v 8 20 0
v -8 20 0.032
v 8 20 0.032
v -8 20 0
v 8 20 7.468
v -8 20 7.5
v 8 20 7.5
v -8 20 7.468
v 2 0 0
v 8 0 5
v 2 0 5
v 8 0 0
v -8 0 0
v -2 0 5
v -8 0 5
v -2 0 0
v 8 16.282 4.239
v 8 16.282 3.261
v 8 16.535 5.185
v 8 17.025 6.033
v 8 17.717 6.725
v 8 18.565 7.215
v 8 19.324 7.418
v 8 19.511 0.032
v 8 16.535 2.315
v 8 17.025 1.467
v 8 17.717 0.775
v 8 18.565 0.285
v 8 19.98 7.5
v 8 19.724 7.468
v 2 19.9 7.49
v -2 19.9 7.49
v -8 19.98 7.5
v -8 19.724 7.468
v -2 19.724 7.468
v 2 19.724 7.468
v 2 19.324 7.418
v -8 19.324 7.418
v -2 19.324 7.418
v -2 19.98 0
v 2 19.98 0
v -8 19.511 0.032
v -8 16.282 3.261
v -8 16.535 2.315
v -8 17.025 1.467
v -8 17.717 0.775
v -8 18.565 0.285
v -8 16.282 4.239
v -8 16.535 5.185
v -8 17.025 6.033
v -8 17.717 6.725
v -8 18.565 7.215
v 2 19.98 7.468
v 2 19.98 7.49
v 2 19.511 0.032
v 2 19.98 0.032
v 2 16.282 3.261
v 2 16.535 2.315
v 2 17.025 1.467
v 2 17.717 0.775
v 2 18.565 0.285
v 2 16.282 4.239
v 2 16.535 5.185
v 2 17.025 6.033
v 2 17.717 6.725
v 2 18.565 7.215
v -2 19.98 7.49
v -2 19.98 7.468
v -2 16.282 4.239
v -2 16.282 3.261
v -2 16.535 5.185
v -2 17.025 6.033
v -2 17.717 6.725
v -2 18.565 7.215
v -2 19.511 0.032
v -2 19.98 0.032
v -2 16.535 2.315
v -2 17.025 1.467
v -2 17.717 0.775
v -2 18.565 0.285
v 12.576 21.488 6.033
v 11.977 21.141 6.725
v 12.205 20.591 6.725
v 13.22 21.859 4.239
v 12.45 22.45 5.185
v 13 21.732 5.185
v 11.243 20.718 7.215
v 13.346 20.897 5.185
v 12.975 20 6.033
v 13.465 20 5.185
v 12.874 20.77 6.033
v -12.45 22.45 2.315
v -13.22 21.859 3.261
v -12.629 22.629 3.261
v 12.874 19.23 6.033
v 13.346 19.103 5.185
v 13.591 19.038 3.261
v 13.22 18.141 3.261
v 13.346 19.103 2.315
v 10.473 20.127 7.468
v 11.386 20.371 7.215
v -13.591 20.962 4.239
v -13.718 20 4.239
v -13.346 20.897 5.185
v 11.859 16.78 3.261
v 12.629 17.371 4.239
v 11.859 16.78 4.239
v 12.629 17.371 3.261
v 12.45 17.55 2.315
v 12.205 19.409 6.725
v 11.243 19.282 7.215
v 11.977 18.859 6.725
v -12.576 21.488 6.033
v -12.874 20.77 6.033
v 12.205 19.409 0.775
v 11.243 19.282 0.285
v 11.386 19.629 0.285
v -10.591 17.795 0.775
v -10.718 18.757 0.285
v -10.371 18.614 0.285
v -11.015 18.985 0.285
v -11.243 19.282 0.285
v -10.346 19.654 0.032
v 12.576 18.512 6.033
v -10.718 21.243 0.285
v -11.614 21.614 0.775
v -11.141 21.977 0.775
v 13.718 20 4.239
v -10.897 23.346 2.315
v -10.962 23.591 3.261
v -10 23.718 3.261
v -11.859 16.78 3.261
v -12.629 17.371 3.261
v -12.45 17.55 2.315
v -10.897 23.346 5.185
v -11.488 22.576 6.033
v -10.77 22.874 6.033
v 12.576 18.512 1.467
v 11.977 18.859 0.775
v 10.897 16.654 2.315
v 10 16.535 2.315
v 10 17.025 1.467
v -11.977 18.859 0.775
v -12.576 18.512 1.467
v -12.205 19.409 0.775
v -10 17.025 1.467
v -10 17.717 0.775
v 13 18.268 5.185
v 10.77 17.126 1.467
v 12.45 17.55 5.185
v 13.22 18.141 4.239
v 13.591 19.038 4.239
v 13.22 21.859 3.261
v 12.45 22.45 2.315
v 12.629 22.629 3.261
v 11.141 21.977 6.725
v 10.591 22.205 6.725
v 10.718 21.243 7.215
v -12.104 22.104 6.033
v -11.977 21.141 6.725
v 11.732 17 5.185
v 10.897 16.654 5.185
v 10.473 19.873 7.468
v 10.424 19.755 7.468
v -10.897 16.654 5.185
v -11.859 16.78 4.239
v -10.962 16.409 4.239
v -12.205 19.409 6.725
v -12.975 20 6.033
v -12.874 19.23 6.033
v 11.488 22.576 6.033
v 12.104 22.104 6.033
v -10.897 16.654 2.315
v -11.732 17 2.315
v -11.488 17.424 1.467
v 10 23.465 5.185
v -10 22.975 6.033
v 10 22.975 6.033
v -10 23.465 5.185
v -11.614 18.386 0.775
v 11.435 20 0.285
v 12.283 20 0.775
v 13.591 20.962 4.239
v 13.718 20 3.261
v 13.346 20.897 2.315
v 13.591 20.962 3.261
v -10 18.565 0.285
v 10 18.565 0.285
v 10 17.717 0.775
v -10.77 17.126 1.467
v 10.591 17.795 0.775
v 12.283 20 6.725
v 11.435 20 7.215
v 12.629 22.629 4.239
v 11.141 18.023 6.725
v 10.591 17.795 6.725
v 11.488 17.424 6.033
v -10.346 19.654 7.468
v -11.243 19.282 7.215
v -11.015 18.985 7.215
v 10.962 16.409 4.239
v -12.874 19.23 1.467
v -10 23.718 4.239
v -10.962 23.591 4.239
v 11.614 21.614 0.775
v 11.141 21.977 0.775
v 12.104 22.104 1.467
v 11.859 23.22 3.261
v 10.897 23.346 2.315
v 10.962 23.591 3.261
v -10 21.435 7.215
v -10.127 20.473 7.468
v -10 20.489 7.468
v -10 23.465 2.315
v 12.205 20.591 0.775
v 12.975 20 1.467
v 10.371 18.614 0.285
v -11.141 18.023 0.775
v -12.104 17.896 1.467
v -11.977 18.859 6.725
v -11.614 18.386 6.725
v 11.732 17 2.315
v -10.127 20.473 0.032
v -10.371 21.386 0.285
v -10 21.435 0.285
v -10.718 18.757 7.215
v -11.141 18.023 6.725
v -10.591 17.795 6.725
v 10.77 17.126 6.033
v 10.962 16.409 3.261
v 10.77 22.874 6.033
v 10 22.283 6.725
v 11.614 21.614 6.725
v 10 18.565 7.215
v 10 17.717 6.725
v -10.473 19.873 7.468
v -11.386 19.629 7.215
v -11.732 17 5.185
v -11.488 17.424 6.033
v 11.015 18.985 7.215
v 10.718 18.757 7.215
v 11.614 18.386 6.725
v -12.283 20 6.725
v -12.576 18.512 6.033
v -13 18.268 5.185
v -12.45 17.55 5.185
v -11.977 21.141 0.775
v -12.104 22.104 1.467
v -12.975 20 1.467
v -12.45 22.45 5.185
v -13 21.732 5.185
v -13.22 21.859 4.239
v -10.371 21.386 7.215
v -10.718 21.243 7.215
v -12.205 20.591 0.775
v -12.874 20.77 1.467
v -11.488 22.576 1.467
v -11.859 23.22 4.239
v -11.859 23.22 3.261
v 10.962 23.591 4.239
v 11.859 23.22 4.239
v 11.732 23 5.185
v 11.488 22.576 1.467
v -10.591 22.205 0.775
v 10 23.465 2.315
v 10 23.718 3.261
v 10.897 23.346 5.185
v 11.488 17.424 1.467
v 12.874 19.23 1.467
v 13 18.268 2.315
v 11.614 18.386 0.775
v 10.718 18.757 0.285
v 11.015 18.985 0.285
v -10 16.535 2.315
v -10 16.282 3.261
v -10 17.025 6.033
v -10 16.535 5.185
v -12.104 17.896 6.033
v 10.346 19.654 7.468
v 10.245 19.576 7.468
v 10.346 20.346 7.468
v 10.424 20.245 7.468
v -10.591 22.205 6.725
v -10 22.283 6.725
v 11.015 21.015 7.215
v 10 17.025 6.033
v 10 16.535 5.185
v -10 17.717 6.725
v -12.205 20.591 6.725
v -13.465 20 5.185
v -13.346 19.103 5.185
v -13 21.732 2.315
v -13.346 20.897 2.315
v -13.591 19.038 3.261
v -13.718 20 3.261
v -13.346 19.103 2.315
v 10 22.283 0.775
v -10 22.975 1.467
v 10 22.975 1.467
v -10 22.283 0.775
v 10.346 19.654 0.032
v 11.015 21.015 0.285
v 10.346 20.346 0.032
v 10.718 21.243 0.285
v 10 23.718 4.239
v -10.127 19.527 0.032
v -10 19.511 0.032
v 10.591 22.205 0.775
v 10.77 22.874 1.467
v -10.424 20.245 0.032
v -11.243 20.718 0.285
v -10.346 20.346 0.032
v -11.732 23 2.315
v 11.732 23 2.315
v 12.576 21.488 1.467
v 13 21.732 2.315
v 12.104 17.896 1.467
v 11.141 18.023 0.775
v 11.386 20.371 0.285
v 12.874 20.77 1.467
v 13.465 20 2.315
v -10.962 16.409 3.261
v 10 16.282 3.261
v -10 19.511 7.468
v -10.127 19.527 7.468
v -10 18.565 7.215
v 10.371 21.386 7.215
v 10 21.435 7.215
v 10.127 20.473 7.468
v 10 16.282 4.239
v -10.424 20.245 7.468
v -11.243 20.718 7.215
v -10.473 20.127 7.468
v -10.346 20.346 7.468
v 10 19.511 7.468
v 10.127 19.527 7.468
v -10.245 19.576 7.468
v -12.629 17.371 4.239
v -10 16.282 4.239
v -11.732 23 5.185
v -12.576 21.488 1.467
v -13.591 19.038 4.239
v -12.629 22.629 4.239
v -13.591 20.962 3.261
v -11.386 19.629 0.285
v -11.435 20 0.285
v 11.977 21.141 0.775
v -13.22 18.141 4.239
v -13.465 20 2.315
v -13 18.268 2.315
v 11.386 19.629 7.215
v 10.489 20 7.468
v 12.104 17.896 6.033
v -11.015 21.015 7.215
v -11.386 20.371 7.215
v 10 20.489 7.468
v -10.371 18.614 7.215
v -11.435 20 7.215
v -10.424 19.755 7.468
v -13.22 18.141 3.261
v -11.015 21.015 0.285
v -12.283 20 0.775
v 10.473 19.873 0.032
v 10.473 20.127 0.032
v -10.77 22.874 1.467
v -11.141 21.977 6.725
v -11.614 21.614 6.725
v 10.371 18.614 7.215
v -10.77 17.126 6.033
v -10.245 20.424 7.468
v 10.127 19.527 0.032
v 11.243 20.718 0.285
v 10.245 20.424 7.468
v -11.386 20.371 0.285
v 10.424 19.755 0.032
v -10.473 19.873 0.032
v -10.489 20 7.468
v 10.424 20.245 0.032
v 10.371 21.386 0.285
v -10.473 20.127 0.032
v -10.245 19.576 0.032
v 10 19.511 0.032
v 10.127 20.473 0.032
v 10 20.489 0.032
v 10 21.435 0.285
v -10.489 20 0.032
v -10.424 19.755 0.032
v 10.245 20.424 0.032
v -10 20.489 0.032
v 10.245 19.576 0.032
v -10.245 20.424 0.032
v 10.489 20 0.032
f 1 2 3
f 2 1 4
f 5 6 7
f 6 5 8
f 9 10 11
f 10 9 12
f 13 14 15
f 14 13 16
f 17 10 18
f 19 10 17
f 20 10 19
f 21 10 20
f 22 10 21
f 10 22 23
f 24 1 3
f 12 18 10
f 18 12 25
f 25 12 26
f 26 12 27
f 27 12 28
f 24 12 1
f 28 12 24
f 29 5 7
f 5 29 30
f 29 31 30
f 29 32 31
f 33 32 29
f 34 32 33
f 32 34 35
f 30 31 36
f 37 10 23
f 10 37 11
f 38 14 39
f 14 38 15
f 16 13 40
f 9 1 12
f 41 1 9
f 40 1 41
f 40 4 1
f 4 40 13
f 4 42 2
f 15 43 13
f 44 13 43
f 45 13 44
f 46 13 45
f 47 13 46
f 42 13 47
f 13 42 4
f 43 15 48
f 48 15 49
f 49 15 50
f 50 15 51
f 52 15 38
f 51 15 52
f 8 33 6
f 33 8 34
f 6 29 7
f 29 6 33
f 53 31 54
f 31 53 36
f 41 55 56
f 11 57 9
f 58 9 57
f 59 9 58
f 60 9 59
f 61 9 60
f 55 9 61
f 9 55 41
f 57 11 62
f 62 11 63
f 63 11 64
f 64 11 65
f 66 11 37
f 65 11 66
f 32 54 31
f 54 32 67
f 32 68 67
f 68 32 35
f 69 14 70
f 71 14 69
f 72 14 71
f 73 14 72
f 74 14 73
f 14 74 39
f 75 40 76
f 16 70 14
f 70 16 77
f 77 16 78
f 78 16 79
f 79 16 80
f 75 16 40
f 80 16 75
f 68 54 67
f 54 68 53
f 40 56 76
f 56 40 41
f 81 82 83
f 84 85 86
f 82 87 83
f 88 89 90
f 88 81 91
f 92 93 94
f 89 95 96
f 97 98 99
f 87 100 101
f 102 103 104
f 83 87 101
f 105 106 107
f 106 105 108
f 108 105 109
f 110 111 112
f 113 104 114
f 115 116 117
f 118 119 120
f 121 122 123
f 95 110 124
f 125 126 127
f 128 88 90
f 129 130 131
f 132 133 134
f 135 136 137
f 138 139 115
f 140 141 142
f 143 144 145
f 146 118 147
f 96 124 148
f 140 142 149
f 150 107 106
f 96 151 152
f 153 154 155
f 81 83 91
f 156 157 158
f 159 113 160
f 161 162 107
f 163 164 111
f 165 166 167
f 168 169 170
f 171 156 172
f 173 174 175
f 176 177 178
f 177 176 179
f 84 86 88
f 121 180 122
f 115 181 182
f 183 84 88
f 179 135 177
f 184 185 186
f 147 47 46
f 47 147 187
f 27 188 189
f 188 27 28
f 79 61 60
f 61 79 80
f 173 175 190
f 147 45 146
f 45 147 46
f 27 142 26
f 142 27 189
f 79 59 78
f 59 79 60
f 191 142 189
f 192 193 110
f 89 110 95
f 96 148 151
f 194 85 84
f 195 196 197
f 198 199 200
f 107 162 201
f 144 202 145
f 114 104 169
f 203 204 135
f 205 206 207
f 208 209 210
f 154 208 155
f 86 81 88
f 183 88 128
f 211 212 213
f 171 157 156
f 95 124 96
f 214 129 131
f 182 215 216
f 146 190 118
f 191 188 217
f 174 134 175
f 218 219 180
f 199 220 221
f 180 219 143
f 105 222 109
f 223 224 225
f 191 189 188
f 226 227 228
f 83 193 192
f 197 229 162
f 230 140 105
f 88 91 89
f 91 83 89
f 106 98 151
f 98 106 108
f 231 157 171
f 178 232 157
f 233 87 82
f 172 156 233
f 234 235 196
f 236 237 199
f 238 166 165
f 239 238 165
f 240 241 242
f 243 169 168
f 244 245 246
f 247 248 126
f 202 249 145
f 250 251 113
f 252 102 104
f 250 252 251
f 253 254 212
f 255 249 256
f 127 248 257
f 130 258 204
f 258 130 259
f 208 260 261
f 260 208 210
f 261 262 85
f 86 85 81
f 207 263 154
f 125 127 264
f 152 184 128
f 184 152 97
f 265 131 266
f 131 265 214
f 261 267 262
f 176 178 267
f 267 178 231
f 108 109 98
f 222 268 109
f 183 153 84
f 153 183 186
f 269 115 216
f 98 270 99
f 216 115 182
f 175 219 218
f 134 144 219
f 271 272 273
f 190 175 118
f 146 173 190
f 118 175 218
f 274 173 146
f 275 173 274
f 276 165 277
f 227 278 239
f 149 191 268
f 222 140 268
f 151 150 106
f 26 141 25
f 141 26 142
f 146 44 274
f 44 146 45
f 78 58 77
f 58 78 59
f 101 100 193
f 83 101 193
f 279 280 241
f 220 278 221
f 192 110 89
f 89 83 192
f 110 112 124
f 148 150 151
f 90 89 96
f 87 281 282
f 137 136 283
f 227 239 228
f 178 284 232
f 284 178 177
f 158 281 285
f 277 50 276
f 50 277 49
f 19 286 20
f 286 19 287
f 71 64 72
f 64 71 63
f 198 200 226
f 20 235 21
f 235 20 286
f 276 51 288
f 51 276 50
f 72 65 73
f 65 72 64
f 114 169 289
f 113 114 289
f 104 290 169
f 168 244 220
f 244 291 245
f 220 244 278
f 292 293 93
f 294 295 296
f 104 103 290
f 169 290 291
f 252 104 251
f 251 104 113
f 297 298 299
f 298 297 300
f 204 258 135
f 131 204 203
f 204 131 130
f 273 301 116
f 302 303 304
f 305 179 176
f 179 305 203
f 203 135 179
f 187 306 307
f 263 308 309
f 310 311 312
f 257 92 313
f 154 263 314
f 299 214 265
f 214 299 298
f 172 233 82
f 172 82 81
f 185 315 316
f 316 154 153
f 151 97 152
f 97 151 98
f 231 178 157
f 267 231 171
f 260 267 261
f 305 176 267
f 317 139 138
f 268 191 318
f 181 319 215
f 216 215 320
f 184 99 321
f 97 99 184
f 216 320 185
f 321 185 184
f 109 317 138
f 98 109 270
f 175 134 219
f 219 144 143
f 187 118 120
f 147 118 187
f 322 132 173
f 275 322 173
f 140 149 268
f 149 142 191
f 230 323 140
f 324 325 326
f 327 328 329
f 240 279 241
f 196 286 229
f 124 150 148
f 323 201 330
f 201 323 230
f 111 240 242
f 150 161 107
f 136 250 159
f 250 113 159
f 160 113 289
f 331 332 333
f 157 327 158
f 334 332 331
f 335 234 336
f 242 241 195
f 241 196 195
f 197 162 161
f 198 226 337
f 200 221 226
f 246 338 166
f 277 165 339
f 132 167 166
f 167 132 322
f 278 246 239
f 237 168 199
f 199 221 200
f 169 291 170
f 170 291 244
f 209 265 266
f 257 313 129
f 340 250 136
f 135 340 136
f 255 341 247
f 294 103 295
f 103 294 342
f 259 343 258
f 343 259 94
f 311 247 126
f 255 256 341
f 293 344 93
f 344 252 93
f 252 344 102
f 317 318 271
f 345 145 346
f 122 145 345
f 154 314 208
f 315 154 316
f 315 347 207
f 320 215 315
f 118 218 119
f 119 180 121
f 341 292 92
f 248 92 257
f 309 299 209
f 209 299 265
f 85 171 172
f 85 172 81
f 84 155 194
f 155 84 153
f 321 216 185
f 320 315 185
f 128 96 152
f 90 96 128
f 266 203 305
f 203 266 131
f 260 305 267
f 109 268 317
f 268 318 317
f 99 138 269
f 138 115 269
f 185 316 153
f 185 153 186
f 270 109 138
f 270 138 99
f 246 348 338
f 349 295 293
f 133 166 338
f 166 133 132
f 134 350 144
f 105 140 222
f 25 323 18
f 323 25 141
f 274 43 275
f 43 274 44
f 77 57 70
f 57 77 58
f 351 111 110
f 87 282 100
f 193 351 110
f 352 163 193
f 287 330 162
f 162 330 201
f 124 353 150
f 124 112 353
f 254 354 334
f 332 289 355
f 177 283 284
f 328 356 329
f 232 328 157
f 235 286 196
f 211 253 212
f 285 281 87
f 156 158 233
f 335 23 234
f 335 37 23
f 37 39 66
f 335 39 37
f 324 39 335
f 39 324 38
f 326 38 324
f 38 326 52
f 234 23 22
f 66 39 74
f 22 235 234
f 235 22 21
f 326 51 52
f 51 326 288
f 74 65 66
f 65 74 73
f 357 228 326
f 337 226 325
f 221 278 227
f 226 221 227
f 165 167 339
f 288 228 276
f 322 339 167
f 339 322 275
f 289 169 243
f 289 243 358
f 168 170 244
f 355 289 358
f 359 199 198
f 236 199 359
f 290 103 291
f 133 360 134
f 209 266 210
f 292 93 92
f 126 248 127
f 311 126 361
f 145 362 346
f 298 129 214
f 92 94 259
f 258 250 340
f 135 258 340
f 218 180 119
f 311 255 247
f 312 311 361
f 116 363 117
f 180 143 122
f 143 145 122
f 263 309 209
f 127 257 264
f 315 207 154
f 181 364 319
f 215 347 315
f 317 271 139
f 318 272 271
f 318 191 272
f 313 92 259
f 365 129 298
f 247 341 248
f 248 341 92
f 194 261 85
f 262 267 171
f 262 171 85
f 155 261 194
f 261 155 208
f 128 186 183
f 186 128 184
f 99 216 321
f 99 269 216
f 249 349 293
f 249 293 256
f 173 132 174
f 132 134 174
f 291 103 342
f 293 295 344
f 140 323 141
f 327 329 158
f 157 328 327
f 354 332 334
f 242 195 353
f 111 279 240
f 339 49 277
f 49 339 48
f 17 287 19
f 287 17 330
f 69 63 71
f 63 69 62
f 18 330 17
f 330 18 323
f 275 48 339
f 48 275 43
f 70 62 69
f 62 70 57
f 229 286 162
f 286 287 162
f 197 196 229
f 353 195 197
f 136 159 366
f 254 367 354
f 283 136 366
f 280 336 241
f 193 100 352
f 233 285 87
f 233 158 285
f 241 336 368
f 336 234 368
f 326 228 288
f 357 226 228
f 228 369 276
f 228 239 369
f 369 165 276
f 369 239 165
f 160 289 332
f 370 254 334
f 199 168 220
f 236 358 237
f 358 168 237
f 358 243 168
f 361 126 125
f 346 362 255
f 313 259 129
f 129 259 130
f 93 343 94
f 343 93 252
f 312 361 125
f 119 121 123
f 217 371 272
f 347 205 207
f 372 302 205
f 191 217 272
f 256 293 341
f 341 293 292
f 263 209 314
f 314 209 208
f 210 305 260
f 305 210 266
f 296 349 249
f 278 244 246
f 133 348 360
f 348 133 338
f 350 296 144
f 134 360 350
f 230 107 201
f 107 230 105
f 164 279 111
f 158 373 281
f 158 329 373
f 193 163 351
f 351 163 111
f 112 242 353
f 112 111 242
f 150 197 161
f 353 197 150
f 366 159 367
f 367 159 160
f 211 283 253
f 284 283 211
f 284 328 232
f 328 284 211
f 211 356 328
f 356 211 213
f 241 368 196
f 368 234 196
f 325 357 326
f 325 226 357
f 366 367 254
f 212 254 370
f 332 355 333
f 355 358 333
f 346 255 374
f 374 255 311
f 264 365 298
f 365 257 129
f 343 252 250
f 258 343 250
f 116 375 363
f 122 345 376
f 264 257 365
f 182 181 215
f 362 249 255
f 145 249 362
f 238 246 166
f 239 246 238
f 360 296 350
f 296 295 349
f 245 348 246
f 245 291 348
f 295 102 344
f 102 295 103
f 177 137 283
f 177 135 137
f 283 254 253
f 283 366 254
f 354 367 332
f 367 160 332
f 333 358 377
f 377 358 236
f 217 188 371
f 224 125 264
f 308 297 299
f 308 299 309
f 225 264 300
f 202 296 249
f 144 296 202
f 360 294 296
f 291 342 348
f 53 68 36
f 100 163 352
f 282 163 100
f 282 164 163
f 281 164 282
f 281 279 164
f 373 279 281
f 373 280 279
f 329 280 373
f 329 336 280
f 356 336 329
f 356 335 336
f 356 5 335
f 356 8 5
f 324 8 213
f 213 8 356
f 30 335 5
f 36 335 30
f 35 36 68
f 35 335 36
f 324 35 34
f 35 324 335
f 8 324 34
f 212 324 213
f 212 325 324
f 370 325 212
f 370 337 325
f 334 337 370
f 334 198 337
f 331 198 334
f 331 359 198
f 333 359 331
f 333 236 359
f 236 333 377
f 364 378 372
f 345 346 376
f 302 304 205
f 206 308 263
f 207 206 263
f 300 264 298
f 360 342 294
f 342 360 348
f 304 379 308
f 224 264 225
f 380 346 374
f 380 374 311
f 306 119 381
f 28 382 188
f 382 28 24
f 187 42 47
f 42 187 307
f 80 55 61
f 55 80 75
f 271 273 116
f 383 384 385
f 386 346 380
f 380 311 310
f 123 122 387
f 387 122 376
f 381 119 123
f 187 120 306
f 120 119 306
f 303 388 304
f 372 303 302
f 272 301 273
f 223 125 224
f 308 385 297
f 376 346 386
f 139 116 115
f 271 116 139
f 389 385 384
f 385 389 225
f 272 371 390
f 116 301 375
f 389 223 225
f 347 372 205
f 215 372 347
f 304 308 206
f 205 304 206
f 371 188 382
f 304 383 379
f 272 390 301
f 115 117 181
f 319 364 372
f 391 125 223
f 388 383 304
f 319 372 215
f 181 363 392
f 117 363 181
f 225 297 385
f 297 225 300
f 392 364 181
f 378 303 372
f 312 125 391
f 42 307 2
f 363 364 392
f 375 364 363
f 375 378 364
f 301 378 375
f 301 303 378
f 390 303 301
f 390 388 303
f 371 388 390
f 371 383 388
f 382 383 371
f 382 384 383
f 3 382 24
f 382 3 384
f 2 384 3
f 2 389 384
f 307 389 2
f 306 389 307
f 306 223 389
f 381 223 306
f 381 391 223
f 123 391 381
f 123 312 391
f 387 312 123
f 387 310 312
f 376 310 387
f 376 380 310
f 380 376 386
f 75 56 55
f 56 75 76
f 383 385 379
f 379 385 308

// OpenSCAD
// [FL_INDEX: keywords="openscad, 3d_parametric, Locking_key_for_Ultimaker_filament_feeder__aka__extruder, csg_solid" | COT="Parametric OpenSCAD design from 3DCodeverse"]
// Title: Locking key for Ultimaker filament feeder (aka "extruder")

// Total width
handleWidth=20;
// Individual arm width
armWidth=6;
// Arm length
armLength=20;
// Arm smaller height (in the frame)
armHeight1=5.0;
// Arm outer height (near the handle)
armHeight2=7.5;

// Ultimaker Extruder/Feeder locking key
// jeremie.francois@gmail.com / MoonCactus on thingiverse / www.tridimake.com
// Rev B: compatible with the customizer for other geometries

handleDiameter= armHeight2;

tol=0.02+0;

armGap=16-armWidth*2;
$fa=1;
$fs=1;
module arm()
{
	translate([-(armWidth+armGap+armWidth)/2,0,0])
	difference()
	{
		hull()
		{
			cube([armWidth+armGap+armWidth,tol,armHeight1]);
			translate([0,armLength-tol,0])
				cube([armWidth+armGap+armWidth,tol,armHeight2]);
		}
		translate([armWidth,-tol,-tol])
			cube([armGap,armLength,armHeight2+0.01]);
	}
	hull()
	{
		for(s=[-1,+1]) scale([s,1,1])
		translate([-handleWidth/2, armLength, handleDiameter/2]) sphere(r=handleDiameter/2);
	}
}

arm();
